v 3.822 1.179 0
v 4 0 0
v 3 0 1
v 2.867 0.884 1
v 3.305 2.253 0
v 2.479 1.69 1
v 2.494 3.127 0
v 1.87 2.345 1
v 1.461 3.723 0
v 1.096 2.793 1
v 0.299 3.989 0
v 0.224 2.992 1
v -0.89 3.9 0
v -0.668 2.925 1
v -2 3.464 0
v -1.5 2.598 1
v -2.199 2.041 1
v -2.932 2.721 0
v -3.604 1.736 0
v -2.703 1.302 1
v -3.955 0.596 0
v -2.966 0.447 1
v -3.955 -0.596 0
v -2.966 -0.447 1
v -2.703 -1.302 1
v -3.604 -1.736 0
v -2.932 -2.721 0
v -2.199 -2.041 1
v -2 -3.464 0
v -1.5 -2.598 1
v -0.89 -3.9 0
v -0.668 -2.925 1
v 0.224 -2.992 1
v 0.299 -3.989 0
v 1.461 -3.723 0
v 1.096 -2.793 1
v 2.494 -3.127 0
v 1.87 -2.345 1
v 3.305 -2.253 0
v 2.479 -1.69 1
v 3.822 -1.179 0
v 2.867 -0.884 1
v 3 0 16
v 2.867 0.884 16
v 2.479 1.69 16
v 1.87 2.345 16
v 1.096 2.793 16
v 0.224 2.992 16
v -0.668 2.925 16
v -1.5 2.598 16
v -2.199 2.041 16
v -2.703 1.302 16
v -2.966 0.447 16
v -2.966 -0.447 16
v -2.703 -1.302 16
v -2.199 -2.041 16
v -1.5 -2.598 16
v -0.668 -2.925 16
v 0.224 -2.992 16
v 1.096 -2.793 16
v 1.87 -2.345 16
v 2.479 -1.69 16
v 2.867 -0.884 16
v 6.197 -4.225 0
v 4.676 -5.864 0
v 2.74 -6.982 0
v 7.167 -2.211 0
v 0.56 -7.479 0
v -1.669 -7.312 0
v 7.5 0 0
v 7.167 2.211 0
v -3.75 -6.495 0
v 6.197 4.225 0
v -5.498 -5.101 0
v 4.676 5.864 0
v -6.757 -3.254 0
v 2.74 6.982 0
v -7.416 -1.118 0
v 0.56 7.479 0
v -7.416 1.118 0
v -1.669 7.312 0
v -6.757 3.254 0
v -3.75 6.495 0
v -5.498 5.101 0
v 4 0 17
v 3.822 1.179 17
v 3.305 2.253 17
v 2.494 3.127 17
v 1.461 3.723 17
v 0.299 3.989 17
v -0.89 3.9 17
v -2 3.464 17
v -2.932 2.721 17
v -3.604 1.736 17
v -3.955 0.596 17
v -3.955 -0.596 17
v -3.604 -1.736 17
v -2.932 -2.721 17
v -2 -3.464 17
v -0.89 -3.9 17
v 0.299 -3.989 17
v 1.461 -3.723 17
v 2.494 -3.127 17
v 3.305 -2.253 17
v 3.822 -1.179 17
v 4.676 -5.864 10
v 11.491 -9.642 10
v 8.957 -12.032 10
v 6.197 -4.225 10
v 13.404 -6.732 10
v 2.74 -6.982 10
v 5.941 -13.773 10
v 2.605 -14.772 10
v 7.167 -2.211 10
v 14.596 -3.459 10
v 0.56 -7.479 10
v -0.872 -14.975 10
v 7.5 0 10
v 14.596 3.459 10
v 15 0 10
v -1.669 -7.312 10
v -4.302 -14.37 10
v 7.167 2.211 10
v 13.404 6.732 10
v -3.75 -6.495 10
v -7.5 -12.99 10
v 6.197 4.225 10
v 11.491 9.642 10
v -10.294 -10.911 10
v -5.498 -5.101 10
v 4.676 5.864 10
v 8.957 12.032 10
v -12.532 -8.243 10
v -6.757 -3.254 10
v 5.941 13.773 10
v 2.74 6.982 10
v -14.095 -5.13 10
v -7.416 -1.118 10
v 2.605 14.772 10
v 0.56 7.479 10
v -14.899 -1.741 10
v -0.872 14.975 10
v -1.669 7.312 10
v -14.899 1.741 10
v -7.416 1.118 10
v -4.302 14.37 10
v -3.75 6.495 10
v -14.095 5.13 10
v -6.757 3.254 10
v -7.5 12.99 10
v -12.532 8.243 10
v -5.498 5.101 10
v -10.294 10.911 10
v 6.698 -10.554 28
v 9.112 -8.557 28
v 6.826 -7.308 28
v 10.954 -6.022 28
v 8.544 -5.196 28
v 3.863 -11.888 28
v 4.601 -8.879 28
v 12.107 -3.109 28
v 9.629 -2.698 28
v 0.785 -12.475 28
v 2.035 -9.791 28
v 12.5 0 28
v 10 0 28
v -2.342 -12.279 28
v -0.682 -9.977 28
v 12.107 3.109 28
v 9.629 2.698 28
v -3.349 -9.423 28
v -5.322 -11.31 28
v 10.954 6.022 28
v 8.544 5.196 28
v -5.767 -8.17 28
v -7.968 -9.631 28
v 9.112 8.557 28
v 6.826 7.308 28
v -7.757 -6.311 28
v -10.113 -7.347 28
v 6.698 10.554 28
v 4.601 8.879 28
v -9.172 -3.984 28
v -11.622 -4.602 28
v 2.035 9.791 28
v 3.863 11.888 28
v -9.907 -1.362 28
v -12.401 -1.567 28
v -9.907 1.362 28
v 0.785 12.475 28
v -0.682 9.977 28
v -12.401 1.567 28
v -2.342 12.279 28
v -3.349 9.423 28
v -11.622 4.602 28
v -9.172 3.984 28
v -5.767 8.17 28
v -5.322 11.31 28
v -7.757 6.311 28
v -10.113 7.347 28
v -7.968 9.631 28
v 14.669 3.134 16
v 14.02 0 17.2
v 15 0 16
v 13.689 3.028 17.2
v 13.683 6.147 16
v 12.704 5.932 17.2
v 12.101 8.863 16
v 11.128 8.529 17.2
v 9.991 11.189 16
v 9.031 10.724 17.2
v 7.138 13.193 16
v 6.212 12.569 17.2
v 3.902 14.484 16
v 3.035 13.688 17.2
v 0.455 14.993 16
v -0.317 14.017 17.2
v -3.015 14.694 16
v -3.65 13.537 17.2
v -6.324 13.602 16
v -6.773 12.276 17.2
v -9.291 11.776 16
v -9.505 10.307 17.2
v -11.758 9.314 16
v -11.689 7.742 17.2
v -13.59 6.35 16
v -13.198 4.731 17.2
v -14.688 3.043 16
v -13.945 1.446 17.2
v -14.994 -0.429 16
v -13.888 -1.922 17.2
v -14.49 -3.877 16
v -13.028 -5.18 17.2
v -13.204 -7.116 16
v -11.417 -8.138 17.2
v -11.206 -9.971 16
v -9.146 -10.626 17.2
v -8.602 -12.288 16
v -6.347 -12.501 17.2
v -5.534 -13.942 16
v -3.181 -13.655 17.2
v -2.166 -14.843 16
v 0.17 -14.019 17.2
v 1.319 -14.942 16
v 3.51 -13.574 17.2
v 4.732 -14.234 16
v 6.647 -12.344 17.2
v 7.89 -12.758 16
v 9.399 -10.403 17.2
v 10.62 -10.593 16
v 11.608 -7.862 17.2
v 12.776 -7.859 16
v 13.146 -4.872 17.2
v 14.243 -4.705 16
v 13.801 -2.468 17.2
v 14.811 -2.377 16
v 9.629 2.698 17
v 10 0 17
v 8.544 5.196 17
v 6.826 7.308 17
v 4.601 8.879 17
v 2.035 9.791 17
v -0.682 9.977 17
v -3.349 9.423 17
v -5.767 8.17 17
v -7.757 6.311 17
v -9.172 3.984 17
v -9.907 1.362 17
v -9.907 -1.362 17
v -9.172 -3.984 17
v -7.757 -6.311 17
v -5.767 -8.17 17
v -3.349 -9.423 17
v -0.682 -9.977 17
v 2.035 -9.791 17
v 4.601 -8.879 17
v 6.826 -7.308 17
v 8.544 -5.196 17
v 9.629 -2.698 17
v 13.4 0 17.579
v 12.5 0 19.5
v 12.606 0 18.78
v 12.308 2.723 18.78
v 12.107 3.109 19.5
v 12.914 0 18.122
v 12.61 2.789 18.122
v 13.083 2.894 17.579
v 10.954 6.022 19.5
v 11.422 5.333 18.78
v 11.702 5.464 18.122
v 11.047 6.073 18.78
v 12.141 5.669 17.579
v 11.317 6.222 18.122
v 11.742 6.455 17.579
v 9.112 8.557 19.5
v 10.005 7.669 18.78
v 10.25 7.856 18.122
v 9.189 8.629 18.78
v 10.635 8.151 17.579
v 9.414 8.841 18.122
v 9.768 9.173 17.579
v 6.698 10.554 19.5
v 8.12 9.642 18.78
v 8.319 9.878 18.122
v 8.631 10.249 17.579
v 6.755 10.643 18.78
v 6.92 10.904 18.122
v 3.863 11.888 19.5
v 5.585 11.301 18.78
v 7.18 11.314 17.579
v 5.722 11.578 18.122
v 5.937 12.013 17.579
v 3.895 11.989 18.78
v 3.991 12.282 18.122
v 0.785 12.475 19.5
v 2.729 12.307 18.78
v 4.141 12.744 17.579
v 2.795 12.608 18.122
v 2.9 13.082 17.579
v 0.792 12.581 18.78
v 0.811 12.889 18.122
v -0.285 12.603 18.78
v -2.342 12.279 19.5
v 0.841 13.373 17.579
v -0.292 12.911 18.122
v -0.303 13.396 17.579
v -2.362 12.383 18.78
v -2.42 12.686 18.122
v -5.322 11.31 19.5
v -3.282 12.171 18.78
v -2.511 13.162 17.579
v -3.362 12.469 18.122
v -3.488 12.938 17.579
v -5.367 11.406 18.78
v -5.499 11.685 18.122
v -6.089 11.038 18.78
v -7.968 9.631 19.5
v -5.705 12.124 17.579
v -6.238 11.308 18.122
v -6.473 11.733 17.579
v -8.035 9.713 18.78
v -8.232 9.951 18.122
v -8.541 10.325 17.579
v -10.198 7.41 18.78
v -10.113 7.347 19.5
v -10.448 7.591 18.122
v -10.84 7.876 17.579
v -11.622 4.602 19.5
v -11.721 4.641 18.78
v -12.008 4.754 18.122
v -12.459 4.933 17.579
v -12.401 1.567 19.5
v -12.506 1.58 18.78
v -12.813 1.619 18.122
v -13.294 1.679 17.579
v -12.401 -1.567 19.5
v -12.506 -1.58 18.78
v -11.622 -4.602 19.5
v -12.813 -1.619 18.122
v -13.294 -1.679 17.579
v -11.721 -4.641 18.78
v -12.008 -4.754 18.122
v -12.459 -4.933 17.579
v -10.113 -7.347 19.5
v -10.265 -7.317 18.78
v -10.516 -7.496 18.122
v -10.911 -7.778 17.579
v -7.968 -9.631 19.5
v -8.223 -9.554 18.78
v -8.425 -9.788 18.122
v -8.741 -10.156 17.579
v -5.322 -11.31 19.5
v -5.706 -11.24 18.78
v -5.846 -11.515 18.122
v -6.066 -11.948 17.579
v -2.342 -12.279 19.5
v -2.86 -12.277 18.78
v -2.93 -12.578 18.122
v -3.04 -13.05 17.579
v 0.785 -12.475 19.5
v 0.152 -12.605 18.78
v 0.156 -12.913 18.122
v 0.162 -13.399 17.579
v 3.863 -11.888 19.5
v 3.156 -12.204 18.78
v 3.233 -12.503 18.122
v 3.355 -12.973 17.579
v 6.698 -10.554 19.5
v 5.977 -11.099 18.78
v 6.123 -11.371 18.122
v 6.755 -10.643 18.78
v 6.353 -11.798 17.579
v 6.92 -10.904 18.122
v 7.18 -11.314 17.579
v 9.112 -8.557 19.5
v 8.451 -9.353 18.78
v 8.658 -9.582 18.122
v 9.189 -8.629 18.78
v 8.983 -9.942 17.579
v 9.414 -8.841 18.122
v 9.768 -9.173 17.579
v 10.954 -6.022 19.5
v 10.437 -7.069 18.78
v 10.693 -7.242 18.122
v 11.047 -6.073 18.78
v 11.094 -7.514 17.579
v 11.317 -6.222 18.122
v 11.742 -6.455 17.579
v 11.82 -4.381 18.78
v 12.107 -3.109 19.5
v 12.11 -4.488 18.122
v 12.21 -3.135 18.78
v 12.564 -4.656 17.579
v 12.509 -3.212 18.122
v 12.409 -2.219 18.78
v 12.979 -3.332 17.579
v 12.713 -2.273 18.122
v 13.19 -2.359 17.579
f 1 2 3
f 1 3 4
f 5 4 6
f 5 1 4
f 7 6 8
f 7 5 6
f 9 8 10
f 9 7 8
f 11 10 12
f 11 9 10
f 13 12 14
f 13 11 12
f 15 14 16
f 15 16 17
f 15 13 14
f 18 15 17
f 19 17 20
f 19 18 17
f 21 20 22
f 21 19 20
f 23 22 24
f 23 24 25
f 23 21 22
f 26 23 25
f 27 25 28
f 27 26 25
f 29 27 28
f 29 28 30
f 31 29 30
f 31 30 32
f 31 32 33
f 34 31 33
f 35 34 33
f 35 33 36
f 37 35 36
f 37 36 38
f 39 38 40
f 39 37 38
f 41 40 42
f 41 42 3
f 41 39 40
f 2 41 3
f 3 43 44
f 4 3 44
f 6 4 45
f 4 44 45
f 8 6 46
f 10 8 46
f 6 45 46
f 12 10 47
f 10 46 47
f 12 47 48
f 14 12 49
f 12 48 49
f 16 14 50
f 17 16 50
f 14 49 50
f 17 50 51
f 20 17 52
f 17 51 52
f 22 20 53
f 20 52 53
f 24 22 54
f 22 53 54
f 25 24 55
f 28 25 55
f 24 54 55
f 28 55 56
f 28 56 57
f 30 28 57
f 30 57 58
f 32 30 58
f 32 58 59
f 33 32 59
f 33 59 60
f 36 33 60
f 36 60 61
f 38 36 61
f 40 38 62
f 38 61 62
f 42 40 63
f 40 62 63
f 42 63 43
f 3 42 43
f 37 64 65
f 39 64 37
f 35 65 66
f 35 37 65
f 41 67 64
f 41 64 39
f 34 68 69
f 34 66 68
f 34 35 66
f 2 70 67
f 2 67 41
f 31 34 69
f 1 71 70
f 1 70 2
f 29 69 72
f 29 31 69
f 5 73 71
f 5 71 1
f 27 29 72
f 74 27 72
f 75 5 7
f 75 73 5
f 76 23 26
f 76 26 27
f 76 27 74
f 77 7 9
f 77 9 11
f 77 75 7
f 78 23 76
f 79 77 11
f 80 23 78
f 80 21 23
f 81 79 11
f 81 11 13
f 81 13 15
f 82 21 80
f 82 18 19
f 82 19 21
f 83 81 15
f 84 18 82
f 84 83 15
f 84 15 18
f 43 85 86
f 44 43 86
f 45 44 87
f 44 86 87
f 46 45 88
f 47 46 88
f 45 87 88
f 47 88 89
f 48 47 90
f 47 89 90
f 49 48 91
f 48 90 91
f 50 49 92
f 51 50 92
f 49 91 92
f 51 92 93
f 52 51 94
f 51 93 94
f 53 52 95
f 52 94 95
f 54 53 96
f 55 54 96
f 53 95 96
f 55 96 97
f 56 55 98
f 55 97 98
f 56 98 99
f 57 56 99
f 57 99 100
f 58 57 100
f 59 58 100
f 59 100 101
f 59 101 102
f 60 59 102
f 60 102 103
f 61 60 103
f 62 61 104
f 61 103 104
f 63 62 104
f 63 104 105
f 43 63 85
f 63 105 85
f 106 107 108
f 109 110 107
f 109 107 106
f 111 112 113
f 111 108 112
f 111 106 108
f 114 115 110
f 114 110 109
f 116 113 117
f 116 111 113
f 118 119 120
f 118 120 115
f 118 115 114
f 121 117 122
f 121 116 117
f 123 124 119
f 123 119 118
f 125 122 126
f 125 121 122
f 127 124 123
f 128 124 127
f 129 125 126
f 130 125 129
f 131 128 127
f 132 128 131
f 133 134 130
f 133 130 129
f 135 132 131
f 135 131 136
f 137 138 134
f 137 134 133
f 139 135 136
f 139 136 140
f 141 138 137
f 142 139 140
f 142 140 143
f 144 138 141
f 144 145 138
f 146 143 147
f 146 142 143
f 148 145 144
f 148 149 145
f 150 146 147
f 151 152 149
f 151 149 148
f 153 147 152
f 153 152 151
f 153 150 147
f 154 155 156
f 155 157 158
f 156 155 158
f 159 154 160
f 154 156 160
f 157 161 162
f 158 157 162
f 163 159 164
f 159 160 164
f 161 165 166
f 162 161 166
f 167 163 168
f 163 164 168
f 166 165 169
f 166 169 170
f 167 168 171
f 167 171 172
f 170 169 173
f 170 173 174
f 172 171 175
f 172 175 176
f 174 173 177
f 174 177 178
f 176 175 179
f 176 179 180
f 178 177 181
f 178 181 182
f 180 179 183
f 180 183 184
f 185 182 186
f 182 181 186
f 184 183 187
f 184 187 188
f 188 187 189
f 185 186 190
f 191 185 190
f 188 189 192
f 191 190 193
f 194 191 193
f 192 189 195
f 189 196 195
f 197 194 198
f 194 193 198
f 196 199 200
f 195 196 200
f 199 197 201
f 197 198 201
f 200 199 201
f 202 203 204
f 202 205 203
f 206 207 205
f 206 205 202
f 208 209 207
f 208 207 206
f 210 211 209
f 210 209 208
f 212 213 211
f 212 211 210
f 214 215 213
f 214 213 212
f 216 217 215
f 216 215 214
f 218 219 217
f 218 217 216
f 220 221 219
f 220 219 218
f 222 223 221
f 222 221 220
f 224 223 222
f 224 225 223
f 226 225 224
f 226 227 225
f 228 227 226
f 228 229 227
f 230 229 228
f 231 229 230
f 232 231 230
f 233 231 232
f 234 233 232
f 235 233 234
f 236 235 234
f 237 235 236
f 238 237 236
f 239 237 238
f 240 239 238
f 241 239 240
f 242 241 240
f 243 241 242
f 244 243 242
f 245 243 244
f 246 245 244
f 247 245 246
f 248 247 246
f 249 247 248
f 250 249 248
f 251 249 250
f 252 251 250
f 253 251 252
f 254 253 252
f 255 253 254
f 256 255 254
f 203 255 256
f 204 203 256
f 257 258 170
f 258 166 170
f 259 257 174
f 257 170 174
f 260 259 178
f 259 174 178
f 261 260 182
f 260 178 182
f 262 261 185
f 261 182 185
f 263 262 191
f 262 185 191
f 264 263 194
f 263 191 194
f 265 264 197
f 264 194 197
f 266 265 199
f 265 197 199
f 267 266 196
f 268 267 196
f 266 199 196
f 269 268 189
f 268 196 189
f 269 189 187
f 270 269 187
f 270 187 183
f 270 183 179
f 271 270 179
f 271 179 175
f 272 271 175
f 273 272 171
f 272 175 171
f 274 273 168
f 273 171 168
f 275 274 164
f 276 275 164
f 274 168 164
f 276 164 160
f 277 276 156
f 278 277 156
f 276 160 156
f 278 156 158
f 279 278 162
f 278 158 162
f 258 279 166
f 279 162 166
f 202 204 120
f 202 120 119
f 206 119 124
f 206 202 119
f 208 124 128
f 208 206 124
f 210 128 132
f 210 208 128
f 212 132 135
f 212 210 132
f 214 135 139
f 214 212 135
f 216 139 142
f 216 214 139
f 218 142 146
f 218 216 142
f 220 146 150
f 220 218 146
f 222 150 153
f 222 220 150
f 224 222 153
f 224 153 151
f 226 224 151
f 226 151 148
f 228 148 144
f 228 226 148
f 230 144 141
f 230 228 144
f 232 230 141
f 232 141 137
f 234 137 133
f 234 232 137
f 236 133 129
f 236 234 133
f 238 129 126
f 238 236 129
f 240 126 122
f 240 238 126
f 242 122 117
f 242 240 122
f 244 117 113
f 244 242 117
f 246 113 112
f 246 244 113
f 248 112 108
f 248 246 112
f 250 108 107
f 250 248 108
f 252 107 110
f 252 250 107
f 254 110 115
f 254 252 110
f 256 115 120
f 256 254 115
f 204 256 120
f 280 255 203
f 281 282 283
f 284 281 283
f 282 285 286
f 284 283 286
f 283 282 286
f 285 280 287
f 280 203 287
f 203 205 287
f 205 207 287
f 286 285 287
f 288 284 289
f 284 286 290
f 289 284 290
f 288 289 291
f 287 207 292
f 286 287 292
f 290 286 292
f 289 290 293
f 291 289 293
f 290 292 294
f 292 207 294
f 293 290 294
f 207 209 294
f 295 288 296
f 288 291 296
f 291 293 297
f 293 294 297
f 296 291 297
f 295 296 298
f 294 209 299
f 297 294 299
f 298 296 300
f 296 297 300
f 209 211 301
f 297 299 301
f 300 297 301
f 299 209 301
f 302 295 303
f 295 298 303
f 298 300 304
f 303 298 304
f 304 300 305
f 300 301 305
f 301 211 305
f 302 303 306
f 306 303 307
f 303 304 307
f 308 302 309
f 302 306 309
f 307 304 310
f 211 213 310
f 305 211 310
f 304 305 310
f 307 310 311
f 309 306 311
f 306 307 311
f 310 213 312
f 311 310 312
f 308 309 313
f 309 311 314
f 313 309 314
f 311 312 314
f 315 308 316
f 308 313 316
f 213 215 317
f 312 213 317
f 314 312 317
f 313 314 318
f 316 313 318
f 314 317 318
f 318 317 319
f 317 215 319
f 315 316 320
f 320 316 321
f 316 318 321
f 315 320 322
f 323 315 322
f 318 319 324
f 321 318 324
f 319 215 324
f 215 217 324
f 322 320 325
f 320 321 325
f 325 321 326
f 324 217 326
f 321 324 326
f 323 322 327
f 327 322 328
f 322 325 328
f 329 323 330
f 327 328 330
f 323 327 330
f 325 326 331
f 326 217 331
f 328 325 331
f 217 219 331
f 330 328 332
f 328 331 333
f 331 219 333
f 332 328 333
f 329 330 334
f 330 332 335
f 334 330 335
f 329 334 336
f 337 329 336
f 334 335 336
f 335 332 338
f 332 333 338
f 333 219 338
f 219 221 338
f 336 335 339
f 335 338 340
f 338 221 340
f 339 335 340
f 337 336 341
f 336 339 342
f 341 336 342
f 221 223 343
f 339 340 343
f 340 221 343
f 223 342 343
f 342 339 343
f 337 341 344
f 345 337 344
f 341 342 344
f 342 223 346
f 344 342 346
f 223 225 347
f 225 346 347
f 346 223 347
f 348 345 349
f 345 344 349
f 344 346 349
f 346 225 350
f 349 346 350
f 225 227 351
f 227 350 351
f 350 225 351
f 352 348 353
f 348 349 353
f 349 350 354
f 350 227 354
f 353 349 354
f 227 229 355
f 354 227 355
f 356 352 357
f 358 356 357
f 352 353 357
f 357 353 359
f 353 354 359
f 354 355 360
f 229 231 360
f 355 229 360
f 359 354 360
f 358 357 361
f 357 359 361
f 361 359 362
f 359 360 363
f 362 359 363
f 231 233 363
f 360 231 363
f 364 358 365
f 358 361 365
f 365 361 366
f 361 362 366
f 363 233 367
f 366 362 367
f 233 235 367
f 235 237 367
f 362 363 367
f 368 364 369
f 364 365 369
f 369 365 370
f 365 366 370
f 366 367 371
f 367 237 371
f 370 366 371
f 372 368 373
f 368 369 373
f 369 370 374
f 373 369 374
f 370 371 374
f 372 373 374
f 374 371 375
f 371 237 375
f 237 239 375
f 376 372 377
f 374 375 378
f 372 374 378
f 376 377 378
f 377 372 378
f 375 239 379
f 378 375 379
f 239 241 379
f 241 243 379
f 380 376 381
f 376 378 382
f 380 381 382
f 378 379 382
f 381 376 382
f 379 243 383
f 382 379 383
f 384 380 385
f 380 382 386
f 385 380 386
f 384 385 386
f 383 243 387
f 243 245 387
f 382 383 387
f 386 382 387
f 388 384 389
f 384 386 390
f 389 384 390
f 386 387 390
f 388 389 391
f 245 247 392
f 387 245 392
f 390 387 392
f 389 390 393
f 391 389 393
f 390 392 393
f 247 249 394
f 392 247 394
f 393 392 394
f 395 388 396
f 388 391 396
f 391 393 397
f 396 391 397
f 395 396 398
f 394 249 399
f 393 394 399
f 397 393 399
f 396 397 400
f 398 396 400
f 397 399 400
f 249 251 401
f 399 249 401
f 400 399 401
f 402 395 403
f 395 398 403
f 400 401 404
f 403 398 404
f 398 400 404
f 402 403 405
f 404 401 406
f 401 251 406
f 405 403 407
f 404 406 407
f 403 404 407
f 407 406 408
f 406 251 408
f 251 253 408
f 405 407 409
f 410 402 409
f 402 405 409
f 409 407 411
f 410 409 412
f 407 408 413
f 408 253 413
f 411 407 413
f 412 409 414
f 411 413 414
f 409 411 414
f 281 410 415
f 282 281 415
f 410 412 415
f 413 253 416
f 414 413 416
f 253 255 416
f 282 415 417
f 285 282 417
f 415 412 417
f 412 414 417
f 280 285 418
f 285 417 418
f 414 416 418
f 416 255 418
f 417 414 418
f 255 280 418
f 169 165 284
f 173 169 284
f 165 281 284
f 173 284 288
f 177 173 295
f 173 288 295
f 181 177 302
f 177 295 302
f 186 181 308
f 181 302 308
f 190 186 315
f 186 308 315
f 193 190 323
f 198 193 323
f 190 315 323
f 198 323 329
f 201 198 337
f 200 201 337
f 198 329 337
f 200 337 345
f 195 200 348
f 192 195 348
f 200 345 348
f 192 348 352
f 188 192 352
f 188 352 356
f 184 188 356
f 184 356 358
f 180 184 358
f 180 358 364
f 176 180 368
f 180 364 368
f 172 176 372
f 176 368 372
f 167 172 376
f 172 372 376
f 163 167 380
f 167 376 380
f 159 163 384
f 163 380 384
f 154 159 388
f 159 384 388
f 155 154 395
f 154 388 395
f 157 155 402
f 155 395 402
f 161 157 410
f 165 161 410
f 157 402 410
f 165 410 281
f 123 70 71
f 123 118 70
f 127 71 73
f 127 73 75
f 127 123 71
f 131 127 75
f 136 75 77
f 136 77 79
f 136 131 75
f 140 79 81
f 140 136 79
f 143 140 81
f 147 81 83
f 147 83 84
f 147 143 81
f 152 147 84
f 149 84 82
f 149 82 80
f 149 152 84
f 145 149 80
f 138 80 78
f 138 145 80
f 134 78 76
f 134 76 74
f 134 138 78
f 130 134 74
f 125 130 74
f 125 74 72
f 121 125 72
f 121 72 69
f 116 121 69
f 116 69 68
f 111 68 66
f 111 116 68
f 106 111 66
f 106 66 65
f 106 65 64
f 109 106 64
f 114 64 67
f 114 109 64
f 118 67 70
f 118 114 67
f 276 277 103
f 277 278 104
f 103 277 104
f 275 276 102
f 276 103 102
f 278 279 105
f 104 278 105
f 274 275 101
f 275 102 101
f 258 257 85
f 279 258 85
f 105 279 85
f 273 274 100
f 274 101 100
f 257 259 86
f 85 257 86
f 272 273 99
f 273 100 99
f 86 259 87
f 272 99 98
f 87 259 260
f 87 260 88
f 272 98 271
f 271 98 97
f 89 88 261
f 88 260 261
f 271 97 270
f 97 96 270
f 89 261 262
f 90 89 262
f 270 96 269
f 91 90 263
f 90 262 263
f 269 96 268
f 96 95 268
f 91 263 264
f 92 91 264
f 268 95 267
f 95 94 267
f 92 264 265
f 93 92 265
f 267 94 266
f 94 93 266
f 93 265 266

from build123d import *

# Parameters (mm, degrees)
CHAMFER_SIZE = 1


with BuildPart() as part:
    # Sketch → Revolution (revolve)
    with BuildSketch(Plane.XZ):
        with BuildLine():
            Line((3, 0), (3, 17))
            Line((3, 17), (10, 17))
            Line((10, 17), (10, 28))
            Line((10, 28), (12.5, 28))
            Line((12.5, 28), (12.5, 19.5))
            ThreePointArc((12.5, 19.5), (13.232233, 17.732233), (15, 17))
            Line((15, 10), (15, 17))
            Line((7.5, 10), (15, 10))
            Line((7.5, 0), (7.5, 10))
            Line((3, 0), (7.5, 0))
        make_face()
    revolve(axis=Axis((0, 0, 0), (0, 0, 1)))

    # Chamfer
    chamfer_edges = [part.edges().sort_by_distance(p)[0] for p in [
        (-15, 0, 17),
        (-3, 0, 0),
        (-3, 0, 17),
    ]]
    chamfer(chamfer_edges, length=CHAMFER_SIZE)


solid = part.part
